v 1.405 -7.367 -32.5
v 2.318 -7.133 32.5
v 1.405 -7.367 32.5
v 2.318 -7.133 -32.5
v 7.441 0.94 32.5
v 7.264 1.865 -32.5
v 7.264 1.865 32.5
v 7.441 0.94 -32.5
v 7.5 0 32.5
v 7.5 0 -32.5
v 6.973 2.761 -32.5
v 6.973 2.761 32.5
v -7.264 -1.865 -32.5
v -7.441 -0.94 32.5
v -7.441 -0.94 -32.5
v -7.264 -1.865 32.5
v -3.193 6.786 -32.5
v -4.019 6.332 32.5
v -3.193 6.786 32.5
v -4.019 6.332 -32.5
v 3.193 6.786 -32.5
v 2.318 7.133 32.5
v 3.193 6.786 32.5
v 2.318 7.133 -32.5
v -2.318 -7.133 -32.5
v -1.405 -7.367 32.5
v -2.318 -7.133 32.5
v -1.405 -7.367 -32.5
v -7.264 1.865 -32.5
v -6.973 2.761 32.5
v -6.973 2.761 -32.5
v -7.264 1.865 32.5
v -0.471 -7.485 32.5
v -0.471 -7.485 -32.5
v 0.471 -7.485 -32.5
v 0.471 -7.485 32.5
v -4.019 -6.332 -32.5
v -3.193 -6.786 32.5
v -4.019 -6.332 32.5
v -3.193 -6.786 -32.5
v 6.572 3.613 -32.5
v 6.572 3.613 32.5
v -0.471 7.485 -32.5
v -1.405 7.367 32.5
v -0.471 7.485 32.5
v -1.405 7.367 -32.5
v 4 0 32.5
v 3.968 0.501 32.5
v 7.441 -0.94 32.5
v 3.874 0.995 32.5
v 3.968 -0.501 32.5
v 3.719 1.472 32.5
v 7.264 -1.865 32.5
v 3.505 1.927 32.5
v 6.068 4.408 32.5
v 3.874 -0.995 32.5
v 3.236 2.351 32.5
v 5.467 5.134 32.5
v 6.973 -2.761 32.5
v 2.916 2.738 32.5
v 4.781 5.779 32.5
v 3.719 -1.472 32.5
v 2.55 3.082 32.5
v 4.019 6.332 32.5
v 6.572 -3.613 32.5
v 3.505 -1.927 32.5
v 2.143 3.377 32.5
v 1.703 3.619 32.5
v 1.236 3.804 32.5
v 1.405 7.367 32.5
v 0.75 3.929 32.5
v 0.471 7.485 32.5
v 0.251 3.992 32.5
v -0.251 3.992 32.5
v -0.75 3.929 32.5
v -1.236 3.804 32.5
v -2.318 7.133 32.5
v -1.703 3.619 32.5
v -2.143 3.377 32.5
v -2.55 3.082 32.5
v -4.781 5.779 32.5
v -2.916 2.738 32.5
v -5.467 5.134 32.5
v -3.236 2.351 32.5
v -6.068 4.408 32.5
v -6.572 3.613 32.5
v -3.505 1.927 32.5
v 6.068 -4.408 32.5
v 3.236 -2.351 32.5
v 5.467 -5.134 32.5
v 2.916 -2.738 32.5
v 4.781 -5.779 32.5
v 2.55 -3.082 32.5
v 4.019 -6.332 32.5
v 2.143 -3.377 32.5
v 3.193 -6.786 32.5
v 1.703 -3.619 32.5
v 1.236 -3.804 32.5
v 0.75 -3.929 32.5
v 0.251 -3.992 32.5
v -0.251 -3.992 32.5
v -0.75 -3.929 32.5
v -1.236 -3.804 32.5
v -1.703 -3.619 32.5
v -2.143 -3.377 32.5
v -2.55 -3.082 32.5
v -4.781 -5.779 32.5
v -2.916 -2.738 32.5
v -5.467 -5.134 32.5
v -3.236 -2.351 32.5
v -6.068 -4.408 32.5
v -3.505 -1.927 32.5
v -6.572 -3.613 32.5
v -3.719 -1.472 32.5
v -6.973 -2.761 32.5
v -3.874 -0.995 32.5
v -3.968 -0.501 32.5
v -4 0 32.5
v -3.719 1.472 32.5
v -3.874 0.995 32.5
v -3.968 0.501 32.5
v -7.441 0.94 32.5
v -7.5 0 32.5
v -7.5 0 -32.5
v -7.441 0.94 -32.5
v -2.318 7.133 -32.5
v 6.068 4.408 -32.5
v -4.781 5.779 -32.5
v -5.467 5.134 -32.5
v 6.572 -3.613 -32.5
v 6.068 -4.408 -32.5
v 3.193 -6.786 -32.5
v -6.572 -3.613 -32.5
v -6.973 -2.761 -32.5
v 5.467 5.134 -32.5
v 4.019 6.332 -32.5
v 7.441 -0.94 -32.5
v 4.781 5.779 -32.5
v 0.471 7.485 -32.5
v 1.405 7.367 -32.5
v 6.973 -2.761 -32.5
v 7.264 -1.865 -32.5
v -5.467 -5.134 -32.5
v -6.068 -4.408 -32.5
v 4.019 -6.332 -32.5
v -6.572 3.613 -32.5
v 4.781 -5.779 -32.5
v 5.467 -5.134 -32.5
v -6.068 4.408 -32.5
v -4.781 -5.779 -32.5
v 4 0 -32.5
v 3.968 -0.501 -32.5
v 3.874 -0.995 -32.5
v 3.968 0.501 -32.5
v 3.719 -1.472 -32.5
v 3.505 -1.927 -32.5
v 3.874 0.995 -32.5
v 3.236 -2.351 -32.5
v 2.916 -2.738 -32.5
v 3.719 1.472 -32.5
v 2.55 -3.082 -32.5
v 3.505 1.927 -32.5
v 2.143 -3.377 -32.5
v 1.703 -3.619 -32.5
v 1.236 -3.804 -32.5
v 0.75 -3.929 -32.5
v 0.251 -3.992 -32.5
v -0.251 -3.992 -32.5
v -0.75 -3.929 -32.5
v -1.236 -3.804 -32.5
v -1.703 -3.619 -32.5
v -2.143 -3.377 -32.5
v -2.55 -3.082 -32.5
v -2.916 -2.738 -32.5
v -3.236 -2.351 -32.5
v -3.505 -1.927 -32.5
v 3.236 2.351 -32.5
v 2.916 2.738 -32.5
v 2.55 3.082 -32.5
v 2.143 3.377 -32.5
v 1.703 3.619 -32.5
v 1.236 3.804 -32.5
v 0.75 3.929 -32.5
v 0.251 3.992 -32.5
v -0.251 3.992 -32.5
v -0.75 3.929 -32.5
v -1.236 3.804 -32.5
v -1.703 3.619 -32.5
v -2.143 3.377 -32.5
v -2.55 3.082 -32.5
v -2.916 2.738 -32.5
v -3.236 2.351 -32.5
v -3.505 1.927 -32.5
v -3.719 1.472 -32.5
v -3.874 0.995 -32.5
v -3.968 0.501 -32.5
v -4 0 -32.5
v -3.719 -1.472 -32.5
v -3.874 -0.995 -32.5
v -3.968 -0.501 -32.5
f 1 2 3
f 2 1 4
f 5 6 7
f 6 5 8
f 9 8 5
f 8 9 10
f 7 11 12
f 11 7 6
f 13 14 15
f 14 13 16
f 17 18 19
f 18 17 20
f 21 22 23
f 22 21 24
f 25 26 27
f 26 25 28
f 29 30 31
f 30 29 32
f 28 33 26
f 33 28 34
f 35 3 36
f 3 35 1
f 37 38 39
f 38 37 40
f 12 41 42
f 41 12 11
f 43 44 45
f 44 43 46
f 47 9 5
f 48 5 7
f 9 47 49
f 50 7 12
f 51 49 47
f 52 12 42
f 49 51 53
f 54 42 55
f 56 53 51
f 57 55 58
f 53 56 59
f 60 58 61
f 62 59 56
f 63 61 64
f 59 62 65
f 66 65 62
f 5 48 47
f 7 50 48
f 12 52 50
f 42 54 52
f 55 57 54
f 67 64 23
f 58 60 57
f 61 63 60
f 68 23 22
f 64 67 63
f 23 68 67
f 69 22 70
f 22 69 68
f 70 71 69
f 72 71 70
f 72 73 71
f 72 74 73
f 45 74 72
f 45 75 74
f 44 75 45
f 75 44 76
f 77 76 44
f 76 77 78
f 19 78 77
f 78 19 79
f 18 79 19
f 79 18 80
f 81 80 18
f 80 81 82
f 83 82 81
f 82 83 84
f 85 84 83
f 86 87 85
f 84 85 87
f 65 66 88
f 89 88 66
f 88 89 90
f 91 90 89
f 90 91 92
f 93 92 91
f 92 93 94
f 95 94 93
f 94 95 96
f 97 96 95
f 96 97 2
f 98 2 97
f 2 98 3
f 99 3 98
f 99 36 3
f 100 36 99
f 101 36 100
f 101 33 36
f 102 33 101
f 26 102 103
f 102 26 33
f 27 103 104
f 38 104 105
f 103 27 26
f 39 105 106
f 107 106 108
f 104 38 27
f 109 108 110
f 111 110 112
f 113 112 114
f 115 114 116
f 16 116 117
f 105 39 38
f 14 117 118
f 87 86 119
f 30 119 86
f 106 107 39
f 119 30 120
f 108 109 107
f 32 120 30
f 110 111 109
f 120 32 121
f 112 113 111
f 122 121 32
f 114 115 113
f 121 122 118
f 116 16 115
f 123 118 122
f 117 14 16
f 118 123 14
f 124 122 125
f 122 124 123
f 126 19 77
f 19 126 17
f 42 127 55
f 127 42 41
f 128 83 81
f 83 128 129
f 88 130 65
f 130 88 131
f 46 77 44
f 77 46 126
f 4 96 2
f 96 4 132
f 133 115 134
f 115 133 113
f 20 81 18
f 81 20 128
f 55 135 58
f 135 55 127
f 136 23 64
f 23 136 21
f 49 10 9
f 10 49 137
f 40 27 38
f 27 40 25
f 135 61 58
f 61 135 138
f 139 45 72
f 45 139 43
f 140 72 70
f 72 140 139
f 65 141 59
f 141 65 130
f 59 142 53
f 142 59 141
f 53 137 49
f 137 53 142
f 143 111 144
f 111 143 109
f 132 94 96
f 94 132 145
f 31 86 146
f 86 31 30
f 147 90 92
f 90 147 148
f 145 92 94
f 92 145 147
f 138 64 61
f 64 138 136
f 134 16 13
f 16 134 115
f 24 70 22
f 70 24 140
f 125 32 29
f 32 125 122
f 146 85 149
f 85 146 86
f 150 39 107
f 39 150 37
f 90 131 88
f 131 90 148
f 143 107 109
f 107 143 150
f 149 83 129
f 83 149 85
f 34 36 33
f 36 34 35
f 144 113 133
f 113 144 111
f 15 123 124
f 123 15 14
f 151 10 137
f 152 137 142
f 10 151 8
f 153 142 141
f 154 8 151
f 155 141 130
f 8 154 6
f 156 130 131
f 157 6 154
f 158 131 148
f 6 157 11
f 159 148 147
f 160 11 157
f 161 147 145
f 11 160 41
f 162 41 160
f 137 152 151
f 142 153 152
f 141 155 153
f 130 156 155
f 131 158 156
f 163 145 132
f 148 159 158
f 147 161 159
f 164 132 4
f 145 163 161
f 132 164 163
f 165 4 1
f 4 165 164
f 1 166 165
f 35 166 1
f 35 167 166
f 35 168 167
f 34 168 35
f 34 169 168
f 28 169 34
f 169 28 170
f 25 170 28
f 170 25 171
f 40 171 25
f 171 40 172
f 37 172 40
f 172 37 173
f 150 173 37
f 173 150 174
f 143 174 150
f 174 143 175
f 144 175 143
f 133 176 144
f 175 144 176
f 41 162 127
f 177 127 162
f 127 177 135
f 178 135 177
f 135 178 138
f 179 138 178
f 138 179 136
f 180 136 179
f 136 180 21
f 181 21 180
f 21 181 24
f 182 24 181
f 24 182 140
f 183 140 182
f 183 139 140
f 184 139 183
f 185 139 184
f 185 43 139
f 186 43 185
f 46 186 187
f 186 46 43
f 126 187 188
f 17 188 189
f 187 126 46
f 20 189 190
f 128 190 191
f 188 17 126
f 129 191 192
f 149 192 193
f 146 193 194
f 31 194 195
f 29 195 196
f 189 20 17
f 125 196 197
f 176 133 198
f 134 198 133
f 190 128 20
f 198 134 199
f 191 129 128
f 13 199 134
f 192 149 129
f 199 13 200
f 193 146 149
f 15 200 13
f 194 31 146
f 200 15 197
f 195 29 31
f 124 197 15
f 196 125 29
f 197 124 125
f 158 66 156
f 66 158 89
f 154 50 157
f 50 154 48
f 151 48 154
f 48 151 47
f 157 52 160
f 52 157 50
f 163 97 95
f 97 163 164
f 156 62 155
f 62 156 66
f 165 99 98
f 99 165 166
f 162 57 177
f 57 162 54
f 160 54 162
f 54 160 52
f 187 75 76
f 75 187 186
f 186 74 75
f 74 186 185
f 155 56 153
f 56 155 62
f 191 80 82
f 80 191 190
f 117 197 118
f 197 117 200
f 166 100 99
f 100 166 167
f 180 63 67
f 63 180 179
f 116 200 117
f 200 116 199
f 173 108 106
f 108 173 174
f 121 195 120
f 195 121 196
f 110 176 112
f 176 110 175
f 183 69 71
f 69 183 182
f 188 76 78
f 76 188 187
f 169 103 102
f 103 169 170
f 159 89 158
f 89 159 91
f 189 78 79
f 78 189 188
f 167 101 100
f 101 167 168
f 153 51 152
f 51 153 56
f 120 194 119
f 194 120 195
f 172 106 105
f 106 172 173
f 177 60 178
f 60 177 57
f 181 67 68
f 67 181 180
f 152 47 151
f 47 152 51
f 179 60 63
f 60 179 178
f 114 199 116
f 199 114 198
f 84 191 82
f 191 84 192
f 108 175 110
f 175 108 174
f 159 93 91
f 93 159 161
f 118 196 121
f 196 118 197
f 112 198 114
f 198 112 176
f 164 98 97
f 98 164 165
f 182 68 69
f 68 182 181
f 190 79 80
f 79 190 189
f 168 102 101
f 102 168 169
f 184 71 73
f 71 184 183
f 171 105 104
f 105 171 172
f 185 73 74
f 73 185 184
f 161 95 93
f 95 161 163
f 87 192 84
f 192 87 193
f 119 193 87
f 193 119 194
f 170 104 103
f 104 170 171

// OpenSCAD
$fn = 50;


difference() {
	union() {
		translate(v = [0, 0, -32.5000000000]) {
			cylinder(h = 65, r = 7.5000000000);
		}
	}
	union() {
		translate(v = [0, 0, -100.0000000000]) {
			cylinder(h = 200, r = 4.0000000000);
		}
	}
}
